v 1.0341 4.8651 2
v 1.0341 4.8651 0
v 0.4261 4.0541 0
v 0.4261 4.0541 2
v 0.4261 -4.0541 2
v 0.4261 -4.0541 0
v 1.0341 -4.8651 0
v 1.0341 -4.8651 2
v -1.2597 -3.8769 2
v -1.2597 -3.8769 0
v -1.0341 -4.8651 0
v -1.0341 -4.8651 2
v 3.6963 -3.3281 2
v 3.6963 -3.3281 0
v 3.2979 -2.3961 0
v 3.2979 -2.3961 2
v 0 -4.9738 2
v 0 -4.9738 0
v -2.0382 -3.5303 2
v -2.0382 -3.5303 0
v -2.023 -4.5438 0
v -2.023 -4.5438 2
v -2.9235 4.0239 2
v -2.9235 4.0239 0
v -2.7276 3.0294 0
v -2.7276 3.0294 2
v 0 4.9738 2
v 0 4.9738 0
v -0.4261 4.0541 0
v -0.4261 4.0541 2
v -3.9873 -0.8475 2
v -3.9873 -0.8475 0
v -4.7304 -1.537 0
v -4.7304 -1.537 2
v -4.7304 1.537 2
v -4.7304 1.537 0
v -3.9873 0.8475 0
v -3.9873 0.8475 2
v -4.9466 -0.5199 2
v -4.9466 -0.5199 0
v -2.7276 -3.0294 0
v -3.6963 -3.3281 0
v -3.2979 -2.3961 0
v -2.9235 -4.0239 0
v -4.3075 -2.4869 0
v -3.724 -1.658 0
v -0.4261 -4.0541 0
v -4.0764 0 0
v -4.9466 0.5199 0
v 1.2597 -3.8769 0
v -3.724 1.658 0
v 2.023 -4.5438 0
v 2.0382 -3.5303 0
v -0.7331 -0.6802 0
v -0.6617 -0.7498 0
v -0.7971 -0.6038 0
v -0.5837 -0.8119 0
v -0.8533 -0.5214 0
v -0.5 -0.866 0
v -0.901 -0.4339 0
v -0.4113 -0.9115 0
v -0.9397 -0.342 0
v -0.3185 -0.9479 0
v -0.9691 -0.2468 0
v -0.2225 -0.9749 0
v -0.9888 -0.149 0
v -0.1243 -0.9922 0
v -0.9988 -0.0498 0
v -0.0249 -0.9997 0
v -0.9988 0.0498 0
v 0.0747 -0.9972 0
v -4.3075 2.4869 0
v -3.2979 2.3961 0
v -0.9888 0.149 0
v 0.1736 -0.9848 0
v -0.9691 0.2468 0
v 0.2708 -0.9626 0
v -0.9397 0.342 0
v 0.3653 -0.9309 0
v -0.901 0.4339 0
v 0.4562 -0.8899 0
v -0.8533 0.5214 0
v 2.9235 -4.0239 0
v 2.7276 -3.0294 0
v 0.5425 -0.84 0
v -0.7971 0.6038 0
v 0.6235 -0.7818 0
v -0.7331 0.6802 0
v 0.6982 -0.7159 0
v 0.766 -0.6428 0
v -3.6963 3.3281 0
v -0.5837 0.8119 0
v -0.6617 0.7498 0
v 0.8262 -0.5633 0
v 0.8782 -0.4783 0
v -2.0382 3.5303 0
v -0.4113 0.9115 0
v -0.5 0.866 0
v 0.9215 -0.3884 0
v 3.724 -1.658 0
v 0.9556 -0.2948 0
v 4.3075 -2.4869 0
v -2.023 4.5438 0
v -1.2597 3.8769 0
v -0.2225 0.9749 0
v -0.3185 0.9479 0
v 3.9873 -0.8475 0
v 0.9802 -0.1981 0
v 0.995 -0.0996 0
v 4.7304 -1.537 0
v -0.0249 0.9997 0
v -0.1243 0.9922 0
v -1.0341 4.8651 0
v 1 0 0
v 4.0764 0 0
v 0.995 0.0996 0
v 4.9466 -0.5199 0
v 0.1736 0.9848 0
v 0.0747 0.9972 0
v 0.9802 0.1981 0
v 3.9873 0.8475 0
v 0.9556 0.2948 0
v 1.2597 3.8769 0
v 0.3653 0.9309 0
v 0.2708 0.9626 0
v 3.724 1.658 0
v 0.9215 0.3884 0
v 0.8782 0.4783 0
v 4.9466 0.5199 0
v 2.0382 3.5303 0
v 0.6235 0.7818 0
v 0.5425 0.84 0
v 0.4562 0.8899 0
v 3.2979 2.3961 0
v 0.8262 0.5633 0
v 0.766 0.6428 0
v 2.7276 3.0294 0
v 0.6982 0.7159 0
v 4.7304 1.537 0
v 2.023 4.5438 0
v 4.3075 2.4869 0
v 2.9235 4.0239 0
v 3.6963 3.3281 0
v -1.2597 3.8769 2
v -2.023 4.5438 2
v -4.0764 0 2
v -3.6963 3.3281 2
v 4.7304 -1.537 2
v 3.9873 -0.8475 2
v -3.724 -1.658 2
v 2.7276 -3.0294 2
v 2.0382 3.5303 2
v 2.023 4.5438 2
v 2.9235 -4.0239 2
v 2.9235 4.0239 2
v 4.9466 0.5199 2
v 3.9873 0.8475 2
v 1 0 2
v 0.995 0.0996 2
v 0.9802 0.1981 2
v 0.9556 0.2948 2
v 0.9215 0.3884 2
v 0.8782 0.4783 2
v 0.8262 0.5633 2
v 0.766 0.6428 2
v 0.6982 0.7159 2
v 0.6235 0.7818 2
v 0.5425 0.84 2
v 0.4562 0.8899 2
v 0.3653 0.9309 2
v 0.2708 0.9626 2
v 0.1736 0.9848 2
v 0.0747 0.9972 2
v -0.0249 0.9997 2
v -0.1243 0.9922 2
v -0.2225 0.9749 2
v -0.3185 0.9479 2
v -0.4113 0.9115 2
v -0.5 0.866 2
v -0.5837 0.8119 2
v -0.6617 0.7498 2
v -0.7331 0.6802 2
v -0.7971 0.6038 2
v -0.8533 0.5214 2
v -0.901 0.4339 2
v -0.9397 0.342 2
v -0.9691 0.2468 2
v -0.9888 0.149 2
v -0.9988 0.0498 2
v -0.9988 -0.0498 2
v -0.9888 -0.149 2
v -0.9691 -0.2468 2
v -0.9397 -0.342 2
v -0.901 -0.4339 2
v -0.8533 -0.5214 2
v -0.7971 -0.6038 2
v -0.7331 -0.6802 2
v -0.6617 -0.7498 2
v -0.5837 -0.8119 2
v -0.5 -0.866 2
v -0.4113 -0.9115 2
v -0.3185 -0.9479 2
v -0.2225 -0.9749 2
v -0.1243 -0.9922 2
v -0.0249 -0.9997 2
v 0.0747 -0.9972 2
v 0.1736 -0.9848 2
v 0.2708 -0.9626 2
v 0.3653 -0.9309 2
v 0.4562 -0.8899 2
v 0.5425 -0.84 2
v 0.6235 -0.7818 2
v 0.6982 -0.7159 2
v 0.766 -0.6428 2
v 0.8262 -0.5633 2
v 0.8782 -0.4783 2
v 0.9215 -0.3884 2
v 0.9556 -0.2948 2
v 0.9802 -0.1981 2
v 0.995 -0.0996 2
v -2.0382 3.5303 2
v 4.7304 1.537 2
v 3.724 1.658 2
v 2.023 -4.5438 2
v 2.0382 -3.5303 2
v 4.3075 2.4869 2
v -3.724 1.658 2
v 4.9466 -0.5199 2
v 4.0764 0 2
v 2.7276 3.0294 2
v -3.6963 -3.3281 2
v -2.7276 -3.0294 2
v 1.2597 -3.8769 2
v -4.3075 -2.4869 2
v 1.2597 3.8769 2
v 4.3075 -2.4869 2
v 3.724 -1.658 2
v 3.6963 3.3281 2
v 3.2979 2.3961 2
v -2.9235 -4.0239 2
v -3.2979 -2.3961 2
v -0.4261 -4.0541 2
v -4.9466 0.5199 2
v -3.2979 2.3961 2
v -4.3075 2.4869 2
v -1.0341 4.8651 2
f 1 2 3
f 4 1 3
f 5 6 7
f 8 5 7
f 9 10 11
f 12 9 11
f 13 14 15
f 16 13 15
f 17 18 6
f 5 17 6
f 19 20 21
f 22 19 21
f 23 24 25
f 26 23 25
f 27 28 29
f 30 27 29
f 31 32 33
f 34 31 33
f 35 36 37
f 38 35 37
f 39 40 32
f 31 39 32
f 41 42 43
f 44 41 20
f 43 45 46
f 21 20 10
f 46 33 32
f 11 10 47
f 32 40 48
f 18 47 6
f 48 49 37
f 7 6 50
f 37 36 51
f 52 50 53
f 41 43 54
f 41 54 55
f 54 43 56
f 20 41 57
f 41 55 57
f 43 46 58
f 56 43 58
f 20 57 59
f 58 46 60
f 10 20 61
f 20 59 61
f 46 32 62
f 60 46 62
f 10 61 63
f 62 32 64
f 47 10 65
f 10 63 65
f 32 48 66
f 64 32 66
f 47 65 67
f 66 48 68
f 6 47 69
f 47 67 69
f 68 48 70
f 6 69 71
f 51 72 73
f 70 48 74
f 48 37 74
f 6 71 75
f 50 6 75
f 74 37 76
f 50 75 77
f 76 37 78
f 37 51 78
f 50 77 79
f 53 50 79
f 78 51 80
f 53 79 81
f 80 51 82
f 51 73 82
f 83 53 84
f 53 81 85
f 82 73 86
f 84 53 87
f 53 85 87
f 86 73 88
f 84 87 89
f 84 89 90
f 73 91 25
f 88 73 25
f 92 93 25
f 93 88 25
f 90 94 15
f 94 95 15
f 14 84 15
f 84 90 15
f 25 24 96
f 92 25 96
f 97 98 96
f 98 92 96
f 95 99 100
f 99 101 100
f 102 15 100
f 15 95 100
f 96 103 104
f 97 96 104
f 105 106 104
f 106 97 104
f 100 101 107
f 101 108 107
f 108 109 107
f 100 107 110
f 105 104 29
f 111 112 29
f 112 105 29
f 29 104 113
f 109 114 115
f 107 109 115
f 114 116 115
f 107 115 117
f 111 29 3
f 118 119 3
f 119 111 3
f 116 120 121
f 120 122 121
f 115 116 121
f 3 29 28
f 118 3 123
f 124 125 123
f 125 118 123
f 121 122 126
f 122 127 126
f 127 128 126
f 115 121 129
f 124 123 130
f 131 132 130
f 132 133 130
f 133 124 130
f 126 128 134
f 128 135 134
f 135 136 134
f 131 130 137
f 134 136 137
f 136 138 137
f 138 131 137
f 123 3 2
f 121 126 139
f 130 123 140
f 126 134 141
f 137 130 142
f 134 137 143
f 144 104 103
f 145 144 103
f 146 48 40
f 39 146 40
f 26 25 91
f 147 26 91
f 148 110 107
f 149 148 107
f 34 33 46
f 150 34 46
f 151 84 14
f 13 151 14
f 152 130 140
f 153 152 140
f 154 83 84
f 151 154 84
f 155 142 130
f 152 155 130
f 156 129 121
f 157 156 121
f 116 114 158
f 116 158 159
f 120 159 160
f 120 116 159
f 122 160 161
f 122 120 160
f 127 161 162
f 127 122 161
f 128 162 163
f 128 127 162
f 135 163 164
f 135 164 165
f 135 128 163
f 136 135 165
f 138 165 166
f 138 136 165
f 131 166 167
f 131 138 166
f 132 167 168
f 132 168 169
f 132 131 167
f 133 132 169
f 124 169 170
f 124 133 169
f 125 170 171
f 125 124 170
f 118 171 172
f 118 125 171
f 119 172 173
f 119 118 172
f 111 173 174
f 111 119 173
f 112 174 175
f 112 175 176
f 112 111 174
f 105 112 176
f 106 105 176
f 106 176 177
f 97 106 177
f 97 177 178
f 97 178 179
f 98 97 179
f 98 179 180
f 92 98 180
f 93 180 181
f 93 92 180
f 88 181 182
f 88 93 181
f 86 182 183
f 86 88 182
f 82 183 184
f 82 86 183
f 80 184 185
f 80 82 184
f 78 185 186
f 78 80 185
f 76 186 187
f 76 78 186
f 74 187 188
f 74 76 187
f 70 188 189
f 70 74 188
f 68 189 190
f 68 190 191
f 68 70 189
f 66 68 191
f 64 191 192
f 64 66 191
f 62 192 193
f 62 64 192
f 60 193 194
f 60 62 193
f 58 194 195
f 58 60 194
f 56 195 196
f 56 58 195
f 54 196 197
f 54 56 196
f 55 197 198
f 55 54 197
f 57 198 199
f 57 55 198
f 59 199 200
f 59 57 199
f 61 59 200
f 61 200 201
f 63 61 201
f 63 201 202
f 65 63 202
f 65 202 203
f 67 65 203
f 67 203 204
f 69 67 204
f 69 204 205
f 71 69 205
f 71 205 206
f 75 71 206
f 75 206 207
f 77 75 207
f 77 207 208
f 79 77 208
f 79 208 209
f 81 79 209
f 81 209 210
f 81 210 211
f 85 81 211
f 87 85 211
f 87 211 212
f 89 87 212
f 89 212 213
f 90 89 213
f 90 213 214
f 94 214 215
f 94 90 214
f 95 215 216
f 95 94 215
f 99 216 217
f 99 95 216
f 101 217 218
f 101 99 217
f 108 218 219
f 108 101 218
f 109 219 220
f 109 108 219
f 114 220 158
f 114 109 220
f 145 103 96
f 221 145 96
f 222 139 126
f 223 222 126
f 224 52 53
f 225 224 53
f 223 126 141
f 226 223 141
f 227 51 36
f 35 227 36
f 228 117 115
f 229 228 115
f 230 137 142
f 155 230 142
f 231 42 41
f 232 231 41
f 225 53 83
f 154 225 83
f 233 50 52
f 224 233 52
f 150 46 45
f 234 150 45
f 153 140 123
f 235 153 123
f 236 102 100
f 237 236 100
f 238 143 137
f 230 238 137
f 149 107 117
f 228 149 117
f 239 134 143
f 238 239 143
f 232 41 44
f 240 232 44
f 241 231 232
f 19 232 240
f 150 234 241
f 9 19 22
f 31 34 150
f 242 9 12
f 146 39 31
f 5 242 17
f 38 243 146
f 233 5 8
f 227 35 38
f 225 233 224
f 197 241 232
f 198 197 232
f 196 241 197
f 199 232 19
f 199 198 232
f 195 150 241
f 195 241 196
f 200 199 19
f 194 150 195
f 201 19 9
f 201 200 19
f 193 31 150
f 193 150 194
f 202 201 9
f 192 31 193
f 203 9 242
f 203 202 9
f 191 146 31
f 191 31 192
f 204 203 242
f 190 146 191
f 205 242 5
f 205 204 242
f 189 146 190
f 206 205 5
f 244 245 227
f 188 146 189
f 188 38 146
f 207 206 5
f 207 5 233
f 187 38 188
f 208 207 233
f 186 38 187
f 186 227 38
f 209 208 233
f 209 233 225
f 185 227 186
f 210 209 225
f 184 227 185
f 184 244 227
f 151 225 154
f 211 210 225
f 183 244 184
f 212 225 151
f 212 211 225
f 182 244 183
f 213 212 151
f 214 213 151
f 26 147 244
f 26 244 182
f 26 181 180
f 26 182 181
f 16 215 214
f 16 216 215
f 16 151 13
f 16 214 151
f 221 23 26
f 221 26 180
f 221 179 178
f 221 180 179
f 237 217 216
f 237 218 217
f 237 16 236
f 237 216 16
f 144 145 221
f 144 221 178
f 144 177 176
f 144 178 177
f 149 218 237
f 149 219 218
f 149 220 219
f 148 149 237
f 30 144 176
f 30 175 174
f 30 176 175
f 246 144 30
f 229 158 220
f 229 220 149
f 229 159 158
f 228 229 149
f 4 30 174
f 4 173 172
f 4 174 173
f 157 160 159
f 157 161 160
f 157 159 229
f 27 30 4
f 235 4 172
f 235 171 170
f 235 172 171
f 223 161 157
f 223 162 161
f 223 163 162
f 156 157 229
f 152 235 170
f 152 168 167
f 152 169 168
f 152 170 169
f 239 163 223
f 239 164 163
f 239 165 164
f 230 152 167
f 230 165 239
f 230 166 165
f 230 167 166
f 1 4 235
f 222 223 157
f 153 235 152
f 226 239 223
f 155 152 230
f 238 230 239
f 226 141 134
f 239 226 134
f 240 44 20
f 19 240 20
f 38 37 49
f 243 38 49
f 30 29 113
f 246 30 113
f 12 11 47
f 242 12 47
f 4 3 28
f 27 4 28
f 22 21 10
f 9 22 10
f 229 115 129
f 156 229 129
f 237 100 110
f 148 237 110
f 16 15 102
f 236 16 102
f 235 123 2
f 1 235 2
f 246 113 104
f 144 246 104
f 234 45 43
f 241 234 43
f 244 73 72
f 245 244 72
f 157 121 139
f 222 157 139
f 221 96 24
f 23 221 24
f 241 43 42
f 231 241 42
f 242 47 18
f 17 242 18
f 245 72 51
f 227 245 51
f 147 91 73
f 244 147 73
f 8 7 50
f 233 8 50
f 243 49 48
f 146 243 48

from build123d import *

# Parameters (mm, degrees)
SKETCH1_R           = 1
BOSS_EXTRUDE3_DEPTH = 2


with BuildPart() as part:
    # Sketch1 → Boss-Extrude3 (new body)
    with BuildSketch(Plane.XY):
        Polygon((0, 4.973839636), (-0.426100438, 4.054074865), (-1.034119408, 4.865149306), (-1.259678681, 3.87689234), (-2.023042837, 4.543828606), (-2.038202921, 3.530271016), (-2.923549585, 4.023920792), (-2.727647913, 3.029359908), (-3.696283188, 3.328148331), (-3.297881603, 2.396051237), (-4.307471479, 2.486919818), (-3.723982041, 1.658023628), (-4.730402596, 1.537000975), (-3.987326594, 0.847532431), (-4.946592422, 0.519907814), (-4.076405843, 0), (-4.946592422, -0.519907814), (-3.987326594, -0.847532431), (-4.730402596, -1.537000975), (-3.723982041, -1.658023628), (-4.307471479, -2.486919818), (-3.297881603, -2.396051237), (-3.696283188, -3.328148331), (-2.727647913, -3.029359908), (-2.923549585, -4.023920792), (-2.038202921, -3.530271016), (-2.023042837, -4.543828606), (-1.259678681, -3.87689234), (-1.034119408, -4.865149306), (-0.426100438, -4.054074865), (0, -4.973839636), (0.426100438, -4.054074865), (1.034119408, -4.865149306), (1.259678681, -3.87689234), (2.023042837, -4.543828606), (2.038202921, -3.530271016), (2.923549585, -4.023920792), (2.727647913, -3.029359908), (3.696283188, -3.328148331), (3.297881603, -2.396051237), (4.307471479, -2.486919818), (3.723982041, -1.658023628), (4.730402596, -1.537000975), (3.987326594, -0.847532431), (4.946592422, -0.519907814), (4.076405843, 0), (4.946592422, 0.519907814), (3.987326594, 0.847532431), (4.730402596, 1.537000975), (3.723982041, 1.658023628), (4.307471479, 2.486919818), (3.297881603, 2.396051237), (3.696283188, 3.328148331), (2.727647913, 3.029359908), (2.923549585, 4.023920792), (2.038202921, 3.530271016), (2.023042837, 4.543828606), (1.259678681, 3.87689234), (1.034119408, 4.865149306), (0.426100438, 4.054074865), align=None)
        Circle(SKETCH1_R, mode=Mode.SUBTRACT)
    extrude(amount=BOSS_EXTRUDE3_DEPTH)


solid = part.part
